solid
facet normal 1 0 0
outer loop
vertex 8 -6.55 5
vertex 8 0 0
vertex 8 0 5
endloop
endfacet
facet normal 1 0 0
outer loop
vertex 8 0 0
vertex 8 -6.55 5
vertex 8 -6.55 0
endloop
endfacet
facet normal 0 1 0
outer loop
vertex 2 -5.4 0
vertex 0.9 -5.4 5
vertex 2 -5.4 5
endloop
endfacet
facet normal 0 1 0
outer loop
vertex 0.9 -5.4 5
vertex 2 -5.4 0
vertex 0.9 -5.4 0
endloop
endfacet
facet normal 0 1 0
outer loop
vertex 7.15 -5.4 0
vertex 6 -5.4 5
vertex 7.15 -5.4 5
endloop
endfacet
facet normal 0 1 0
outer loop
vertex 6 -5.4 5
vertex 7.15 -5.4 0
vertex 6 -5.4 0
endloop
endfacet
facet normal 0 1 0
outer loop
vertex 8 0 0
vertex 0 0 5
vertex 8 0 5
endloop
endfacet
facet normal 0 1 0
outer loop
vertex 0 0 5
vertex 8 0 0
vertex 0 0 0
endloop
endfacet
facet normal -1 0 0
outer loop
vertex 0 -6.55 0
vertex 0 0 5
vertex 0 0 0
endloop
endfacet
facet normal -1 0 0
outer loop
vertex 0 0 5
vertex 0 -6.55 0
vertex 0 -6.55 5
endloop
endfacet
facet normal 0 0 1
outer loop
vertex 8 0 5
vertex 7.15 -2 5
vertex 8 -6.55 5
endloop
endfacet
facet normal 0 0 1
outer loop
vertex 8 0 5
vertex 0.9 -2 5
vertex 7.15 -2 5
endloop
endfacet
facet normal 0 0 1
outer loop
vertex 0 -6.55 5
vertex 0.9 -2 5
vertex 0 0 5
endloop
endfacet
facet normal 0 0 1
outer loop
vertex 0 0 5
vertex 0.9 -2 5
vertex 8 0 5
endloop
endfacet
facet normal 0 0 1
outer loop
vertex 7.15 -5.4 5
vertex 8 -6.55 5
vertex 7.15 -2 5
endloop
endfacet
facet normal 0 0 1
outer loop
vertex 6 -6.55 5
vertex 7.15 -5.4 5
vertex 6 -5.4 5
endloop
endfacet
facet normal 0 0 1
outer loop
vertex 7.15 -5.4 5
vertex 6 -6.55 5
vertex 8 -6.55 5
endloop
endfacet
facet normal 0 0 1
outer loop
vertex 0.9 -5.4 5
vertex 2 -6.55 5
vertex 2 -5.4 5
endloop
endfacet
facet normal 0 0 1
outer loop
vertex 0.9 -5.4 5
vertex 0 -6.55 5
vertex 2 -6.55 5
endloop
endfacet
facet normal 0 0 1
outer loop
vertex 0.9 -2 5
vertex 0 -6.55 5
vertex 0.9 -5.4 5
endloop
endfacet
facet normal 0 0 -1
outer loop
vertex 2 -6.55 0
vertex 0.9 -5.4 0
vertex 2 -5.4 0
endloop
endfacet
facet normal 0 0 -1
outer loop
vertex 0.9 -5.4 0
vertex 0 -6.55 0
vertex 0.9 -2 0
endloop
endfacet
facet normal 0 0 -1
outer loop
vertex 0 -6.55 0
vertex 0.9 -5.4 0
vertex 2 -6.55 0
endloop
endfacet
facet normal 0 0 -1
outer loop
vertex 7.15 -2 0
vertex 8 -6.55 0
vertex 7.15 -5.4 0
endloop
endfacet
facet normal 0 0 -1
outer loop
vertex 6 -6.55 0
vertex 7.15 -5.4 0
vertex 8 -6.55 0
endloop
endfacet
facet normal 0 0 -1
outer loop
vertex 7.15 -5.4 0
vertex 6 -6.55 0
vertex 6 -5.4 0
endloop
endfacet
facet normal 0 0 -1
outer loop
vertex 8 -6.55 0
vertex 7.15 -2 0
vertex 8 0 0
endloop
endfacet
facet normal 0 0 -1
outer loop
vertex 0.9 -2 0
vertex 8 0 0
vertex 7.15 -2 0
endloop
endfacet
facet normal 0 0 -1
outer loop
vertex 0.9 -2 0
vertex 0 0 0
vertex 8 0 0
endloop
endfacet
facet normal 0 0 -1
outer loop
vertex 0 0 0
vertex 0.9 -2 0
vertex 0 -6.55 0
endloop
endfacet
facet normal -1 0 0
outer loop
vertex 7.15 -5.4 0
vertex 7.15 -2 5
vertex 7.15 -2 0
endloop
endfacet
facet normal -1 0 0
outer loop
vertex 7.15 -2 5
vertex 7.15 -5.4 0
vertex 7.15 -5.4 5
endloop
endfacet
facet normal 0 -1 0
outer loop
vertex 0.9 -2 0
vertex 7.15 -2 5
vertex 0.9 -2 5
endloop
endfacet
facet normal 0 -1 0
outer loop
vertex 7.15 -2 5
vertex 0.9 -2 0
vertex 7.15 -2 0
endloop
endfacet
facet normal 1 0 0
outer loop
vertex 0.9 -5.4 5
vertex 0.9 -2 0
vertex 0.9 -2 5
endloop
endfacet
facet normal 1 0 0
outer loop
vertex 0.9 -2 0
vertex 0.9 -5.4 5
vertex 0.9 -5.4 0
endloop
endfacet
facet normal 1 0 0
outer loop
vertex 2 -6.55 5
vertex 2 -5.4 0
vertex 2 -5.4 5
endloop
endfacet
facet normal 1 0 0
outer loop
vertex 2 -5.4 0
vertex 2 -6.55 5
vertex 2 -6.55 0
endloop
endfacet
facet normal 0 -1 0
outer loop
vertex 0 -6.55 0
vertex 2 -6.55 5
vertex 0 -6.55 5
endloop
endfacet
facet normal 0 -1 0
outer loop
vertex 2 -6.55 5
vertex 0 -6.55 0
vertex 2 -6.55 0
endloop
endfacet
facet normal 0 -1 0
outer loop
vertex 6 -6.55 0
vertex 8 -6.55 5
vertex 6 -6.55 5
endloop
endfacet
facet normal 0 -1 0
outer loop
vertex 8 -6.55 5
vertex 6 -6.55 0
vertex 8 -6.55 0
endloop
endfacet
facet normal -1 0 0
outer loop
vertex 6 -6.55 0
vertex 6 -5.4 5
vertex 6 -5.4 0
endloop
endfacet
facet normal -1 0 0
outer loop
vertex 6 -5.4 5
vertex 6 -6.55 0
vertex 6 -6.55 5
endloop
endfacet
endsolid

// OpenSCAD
rotate([90,0,0])
union(){

	difference(){
		resize([8,5,5.4])
		cube(2);
		translate([.9,0,2])
		resize([6.25,5,5.5])
		cube(2);
	}//end difference
	translate([0,0,5.4])
	resize([2,5,1.15])
	cube(2);

	translate([6,0,5.4])
	resize([2,5,1.15])
	cube(2);
}//end union
